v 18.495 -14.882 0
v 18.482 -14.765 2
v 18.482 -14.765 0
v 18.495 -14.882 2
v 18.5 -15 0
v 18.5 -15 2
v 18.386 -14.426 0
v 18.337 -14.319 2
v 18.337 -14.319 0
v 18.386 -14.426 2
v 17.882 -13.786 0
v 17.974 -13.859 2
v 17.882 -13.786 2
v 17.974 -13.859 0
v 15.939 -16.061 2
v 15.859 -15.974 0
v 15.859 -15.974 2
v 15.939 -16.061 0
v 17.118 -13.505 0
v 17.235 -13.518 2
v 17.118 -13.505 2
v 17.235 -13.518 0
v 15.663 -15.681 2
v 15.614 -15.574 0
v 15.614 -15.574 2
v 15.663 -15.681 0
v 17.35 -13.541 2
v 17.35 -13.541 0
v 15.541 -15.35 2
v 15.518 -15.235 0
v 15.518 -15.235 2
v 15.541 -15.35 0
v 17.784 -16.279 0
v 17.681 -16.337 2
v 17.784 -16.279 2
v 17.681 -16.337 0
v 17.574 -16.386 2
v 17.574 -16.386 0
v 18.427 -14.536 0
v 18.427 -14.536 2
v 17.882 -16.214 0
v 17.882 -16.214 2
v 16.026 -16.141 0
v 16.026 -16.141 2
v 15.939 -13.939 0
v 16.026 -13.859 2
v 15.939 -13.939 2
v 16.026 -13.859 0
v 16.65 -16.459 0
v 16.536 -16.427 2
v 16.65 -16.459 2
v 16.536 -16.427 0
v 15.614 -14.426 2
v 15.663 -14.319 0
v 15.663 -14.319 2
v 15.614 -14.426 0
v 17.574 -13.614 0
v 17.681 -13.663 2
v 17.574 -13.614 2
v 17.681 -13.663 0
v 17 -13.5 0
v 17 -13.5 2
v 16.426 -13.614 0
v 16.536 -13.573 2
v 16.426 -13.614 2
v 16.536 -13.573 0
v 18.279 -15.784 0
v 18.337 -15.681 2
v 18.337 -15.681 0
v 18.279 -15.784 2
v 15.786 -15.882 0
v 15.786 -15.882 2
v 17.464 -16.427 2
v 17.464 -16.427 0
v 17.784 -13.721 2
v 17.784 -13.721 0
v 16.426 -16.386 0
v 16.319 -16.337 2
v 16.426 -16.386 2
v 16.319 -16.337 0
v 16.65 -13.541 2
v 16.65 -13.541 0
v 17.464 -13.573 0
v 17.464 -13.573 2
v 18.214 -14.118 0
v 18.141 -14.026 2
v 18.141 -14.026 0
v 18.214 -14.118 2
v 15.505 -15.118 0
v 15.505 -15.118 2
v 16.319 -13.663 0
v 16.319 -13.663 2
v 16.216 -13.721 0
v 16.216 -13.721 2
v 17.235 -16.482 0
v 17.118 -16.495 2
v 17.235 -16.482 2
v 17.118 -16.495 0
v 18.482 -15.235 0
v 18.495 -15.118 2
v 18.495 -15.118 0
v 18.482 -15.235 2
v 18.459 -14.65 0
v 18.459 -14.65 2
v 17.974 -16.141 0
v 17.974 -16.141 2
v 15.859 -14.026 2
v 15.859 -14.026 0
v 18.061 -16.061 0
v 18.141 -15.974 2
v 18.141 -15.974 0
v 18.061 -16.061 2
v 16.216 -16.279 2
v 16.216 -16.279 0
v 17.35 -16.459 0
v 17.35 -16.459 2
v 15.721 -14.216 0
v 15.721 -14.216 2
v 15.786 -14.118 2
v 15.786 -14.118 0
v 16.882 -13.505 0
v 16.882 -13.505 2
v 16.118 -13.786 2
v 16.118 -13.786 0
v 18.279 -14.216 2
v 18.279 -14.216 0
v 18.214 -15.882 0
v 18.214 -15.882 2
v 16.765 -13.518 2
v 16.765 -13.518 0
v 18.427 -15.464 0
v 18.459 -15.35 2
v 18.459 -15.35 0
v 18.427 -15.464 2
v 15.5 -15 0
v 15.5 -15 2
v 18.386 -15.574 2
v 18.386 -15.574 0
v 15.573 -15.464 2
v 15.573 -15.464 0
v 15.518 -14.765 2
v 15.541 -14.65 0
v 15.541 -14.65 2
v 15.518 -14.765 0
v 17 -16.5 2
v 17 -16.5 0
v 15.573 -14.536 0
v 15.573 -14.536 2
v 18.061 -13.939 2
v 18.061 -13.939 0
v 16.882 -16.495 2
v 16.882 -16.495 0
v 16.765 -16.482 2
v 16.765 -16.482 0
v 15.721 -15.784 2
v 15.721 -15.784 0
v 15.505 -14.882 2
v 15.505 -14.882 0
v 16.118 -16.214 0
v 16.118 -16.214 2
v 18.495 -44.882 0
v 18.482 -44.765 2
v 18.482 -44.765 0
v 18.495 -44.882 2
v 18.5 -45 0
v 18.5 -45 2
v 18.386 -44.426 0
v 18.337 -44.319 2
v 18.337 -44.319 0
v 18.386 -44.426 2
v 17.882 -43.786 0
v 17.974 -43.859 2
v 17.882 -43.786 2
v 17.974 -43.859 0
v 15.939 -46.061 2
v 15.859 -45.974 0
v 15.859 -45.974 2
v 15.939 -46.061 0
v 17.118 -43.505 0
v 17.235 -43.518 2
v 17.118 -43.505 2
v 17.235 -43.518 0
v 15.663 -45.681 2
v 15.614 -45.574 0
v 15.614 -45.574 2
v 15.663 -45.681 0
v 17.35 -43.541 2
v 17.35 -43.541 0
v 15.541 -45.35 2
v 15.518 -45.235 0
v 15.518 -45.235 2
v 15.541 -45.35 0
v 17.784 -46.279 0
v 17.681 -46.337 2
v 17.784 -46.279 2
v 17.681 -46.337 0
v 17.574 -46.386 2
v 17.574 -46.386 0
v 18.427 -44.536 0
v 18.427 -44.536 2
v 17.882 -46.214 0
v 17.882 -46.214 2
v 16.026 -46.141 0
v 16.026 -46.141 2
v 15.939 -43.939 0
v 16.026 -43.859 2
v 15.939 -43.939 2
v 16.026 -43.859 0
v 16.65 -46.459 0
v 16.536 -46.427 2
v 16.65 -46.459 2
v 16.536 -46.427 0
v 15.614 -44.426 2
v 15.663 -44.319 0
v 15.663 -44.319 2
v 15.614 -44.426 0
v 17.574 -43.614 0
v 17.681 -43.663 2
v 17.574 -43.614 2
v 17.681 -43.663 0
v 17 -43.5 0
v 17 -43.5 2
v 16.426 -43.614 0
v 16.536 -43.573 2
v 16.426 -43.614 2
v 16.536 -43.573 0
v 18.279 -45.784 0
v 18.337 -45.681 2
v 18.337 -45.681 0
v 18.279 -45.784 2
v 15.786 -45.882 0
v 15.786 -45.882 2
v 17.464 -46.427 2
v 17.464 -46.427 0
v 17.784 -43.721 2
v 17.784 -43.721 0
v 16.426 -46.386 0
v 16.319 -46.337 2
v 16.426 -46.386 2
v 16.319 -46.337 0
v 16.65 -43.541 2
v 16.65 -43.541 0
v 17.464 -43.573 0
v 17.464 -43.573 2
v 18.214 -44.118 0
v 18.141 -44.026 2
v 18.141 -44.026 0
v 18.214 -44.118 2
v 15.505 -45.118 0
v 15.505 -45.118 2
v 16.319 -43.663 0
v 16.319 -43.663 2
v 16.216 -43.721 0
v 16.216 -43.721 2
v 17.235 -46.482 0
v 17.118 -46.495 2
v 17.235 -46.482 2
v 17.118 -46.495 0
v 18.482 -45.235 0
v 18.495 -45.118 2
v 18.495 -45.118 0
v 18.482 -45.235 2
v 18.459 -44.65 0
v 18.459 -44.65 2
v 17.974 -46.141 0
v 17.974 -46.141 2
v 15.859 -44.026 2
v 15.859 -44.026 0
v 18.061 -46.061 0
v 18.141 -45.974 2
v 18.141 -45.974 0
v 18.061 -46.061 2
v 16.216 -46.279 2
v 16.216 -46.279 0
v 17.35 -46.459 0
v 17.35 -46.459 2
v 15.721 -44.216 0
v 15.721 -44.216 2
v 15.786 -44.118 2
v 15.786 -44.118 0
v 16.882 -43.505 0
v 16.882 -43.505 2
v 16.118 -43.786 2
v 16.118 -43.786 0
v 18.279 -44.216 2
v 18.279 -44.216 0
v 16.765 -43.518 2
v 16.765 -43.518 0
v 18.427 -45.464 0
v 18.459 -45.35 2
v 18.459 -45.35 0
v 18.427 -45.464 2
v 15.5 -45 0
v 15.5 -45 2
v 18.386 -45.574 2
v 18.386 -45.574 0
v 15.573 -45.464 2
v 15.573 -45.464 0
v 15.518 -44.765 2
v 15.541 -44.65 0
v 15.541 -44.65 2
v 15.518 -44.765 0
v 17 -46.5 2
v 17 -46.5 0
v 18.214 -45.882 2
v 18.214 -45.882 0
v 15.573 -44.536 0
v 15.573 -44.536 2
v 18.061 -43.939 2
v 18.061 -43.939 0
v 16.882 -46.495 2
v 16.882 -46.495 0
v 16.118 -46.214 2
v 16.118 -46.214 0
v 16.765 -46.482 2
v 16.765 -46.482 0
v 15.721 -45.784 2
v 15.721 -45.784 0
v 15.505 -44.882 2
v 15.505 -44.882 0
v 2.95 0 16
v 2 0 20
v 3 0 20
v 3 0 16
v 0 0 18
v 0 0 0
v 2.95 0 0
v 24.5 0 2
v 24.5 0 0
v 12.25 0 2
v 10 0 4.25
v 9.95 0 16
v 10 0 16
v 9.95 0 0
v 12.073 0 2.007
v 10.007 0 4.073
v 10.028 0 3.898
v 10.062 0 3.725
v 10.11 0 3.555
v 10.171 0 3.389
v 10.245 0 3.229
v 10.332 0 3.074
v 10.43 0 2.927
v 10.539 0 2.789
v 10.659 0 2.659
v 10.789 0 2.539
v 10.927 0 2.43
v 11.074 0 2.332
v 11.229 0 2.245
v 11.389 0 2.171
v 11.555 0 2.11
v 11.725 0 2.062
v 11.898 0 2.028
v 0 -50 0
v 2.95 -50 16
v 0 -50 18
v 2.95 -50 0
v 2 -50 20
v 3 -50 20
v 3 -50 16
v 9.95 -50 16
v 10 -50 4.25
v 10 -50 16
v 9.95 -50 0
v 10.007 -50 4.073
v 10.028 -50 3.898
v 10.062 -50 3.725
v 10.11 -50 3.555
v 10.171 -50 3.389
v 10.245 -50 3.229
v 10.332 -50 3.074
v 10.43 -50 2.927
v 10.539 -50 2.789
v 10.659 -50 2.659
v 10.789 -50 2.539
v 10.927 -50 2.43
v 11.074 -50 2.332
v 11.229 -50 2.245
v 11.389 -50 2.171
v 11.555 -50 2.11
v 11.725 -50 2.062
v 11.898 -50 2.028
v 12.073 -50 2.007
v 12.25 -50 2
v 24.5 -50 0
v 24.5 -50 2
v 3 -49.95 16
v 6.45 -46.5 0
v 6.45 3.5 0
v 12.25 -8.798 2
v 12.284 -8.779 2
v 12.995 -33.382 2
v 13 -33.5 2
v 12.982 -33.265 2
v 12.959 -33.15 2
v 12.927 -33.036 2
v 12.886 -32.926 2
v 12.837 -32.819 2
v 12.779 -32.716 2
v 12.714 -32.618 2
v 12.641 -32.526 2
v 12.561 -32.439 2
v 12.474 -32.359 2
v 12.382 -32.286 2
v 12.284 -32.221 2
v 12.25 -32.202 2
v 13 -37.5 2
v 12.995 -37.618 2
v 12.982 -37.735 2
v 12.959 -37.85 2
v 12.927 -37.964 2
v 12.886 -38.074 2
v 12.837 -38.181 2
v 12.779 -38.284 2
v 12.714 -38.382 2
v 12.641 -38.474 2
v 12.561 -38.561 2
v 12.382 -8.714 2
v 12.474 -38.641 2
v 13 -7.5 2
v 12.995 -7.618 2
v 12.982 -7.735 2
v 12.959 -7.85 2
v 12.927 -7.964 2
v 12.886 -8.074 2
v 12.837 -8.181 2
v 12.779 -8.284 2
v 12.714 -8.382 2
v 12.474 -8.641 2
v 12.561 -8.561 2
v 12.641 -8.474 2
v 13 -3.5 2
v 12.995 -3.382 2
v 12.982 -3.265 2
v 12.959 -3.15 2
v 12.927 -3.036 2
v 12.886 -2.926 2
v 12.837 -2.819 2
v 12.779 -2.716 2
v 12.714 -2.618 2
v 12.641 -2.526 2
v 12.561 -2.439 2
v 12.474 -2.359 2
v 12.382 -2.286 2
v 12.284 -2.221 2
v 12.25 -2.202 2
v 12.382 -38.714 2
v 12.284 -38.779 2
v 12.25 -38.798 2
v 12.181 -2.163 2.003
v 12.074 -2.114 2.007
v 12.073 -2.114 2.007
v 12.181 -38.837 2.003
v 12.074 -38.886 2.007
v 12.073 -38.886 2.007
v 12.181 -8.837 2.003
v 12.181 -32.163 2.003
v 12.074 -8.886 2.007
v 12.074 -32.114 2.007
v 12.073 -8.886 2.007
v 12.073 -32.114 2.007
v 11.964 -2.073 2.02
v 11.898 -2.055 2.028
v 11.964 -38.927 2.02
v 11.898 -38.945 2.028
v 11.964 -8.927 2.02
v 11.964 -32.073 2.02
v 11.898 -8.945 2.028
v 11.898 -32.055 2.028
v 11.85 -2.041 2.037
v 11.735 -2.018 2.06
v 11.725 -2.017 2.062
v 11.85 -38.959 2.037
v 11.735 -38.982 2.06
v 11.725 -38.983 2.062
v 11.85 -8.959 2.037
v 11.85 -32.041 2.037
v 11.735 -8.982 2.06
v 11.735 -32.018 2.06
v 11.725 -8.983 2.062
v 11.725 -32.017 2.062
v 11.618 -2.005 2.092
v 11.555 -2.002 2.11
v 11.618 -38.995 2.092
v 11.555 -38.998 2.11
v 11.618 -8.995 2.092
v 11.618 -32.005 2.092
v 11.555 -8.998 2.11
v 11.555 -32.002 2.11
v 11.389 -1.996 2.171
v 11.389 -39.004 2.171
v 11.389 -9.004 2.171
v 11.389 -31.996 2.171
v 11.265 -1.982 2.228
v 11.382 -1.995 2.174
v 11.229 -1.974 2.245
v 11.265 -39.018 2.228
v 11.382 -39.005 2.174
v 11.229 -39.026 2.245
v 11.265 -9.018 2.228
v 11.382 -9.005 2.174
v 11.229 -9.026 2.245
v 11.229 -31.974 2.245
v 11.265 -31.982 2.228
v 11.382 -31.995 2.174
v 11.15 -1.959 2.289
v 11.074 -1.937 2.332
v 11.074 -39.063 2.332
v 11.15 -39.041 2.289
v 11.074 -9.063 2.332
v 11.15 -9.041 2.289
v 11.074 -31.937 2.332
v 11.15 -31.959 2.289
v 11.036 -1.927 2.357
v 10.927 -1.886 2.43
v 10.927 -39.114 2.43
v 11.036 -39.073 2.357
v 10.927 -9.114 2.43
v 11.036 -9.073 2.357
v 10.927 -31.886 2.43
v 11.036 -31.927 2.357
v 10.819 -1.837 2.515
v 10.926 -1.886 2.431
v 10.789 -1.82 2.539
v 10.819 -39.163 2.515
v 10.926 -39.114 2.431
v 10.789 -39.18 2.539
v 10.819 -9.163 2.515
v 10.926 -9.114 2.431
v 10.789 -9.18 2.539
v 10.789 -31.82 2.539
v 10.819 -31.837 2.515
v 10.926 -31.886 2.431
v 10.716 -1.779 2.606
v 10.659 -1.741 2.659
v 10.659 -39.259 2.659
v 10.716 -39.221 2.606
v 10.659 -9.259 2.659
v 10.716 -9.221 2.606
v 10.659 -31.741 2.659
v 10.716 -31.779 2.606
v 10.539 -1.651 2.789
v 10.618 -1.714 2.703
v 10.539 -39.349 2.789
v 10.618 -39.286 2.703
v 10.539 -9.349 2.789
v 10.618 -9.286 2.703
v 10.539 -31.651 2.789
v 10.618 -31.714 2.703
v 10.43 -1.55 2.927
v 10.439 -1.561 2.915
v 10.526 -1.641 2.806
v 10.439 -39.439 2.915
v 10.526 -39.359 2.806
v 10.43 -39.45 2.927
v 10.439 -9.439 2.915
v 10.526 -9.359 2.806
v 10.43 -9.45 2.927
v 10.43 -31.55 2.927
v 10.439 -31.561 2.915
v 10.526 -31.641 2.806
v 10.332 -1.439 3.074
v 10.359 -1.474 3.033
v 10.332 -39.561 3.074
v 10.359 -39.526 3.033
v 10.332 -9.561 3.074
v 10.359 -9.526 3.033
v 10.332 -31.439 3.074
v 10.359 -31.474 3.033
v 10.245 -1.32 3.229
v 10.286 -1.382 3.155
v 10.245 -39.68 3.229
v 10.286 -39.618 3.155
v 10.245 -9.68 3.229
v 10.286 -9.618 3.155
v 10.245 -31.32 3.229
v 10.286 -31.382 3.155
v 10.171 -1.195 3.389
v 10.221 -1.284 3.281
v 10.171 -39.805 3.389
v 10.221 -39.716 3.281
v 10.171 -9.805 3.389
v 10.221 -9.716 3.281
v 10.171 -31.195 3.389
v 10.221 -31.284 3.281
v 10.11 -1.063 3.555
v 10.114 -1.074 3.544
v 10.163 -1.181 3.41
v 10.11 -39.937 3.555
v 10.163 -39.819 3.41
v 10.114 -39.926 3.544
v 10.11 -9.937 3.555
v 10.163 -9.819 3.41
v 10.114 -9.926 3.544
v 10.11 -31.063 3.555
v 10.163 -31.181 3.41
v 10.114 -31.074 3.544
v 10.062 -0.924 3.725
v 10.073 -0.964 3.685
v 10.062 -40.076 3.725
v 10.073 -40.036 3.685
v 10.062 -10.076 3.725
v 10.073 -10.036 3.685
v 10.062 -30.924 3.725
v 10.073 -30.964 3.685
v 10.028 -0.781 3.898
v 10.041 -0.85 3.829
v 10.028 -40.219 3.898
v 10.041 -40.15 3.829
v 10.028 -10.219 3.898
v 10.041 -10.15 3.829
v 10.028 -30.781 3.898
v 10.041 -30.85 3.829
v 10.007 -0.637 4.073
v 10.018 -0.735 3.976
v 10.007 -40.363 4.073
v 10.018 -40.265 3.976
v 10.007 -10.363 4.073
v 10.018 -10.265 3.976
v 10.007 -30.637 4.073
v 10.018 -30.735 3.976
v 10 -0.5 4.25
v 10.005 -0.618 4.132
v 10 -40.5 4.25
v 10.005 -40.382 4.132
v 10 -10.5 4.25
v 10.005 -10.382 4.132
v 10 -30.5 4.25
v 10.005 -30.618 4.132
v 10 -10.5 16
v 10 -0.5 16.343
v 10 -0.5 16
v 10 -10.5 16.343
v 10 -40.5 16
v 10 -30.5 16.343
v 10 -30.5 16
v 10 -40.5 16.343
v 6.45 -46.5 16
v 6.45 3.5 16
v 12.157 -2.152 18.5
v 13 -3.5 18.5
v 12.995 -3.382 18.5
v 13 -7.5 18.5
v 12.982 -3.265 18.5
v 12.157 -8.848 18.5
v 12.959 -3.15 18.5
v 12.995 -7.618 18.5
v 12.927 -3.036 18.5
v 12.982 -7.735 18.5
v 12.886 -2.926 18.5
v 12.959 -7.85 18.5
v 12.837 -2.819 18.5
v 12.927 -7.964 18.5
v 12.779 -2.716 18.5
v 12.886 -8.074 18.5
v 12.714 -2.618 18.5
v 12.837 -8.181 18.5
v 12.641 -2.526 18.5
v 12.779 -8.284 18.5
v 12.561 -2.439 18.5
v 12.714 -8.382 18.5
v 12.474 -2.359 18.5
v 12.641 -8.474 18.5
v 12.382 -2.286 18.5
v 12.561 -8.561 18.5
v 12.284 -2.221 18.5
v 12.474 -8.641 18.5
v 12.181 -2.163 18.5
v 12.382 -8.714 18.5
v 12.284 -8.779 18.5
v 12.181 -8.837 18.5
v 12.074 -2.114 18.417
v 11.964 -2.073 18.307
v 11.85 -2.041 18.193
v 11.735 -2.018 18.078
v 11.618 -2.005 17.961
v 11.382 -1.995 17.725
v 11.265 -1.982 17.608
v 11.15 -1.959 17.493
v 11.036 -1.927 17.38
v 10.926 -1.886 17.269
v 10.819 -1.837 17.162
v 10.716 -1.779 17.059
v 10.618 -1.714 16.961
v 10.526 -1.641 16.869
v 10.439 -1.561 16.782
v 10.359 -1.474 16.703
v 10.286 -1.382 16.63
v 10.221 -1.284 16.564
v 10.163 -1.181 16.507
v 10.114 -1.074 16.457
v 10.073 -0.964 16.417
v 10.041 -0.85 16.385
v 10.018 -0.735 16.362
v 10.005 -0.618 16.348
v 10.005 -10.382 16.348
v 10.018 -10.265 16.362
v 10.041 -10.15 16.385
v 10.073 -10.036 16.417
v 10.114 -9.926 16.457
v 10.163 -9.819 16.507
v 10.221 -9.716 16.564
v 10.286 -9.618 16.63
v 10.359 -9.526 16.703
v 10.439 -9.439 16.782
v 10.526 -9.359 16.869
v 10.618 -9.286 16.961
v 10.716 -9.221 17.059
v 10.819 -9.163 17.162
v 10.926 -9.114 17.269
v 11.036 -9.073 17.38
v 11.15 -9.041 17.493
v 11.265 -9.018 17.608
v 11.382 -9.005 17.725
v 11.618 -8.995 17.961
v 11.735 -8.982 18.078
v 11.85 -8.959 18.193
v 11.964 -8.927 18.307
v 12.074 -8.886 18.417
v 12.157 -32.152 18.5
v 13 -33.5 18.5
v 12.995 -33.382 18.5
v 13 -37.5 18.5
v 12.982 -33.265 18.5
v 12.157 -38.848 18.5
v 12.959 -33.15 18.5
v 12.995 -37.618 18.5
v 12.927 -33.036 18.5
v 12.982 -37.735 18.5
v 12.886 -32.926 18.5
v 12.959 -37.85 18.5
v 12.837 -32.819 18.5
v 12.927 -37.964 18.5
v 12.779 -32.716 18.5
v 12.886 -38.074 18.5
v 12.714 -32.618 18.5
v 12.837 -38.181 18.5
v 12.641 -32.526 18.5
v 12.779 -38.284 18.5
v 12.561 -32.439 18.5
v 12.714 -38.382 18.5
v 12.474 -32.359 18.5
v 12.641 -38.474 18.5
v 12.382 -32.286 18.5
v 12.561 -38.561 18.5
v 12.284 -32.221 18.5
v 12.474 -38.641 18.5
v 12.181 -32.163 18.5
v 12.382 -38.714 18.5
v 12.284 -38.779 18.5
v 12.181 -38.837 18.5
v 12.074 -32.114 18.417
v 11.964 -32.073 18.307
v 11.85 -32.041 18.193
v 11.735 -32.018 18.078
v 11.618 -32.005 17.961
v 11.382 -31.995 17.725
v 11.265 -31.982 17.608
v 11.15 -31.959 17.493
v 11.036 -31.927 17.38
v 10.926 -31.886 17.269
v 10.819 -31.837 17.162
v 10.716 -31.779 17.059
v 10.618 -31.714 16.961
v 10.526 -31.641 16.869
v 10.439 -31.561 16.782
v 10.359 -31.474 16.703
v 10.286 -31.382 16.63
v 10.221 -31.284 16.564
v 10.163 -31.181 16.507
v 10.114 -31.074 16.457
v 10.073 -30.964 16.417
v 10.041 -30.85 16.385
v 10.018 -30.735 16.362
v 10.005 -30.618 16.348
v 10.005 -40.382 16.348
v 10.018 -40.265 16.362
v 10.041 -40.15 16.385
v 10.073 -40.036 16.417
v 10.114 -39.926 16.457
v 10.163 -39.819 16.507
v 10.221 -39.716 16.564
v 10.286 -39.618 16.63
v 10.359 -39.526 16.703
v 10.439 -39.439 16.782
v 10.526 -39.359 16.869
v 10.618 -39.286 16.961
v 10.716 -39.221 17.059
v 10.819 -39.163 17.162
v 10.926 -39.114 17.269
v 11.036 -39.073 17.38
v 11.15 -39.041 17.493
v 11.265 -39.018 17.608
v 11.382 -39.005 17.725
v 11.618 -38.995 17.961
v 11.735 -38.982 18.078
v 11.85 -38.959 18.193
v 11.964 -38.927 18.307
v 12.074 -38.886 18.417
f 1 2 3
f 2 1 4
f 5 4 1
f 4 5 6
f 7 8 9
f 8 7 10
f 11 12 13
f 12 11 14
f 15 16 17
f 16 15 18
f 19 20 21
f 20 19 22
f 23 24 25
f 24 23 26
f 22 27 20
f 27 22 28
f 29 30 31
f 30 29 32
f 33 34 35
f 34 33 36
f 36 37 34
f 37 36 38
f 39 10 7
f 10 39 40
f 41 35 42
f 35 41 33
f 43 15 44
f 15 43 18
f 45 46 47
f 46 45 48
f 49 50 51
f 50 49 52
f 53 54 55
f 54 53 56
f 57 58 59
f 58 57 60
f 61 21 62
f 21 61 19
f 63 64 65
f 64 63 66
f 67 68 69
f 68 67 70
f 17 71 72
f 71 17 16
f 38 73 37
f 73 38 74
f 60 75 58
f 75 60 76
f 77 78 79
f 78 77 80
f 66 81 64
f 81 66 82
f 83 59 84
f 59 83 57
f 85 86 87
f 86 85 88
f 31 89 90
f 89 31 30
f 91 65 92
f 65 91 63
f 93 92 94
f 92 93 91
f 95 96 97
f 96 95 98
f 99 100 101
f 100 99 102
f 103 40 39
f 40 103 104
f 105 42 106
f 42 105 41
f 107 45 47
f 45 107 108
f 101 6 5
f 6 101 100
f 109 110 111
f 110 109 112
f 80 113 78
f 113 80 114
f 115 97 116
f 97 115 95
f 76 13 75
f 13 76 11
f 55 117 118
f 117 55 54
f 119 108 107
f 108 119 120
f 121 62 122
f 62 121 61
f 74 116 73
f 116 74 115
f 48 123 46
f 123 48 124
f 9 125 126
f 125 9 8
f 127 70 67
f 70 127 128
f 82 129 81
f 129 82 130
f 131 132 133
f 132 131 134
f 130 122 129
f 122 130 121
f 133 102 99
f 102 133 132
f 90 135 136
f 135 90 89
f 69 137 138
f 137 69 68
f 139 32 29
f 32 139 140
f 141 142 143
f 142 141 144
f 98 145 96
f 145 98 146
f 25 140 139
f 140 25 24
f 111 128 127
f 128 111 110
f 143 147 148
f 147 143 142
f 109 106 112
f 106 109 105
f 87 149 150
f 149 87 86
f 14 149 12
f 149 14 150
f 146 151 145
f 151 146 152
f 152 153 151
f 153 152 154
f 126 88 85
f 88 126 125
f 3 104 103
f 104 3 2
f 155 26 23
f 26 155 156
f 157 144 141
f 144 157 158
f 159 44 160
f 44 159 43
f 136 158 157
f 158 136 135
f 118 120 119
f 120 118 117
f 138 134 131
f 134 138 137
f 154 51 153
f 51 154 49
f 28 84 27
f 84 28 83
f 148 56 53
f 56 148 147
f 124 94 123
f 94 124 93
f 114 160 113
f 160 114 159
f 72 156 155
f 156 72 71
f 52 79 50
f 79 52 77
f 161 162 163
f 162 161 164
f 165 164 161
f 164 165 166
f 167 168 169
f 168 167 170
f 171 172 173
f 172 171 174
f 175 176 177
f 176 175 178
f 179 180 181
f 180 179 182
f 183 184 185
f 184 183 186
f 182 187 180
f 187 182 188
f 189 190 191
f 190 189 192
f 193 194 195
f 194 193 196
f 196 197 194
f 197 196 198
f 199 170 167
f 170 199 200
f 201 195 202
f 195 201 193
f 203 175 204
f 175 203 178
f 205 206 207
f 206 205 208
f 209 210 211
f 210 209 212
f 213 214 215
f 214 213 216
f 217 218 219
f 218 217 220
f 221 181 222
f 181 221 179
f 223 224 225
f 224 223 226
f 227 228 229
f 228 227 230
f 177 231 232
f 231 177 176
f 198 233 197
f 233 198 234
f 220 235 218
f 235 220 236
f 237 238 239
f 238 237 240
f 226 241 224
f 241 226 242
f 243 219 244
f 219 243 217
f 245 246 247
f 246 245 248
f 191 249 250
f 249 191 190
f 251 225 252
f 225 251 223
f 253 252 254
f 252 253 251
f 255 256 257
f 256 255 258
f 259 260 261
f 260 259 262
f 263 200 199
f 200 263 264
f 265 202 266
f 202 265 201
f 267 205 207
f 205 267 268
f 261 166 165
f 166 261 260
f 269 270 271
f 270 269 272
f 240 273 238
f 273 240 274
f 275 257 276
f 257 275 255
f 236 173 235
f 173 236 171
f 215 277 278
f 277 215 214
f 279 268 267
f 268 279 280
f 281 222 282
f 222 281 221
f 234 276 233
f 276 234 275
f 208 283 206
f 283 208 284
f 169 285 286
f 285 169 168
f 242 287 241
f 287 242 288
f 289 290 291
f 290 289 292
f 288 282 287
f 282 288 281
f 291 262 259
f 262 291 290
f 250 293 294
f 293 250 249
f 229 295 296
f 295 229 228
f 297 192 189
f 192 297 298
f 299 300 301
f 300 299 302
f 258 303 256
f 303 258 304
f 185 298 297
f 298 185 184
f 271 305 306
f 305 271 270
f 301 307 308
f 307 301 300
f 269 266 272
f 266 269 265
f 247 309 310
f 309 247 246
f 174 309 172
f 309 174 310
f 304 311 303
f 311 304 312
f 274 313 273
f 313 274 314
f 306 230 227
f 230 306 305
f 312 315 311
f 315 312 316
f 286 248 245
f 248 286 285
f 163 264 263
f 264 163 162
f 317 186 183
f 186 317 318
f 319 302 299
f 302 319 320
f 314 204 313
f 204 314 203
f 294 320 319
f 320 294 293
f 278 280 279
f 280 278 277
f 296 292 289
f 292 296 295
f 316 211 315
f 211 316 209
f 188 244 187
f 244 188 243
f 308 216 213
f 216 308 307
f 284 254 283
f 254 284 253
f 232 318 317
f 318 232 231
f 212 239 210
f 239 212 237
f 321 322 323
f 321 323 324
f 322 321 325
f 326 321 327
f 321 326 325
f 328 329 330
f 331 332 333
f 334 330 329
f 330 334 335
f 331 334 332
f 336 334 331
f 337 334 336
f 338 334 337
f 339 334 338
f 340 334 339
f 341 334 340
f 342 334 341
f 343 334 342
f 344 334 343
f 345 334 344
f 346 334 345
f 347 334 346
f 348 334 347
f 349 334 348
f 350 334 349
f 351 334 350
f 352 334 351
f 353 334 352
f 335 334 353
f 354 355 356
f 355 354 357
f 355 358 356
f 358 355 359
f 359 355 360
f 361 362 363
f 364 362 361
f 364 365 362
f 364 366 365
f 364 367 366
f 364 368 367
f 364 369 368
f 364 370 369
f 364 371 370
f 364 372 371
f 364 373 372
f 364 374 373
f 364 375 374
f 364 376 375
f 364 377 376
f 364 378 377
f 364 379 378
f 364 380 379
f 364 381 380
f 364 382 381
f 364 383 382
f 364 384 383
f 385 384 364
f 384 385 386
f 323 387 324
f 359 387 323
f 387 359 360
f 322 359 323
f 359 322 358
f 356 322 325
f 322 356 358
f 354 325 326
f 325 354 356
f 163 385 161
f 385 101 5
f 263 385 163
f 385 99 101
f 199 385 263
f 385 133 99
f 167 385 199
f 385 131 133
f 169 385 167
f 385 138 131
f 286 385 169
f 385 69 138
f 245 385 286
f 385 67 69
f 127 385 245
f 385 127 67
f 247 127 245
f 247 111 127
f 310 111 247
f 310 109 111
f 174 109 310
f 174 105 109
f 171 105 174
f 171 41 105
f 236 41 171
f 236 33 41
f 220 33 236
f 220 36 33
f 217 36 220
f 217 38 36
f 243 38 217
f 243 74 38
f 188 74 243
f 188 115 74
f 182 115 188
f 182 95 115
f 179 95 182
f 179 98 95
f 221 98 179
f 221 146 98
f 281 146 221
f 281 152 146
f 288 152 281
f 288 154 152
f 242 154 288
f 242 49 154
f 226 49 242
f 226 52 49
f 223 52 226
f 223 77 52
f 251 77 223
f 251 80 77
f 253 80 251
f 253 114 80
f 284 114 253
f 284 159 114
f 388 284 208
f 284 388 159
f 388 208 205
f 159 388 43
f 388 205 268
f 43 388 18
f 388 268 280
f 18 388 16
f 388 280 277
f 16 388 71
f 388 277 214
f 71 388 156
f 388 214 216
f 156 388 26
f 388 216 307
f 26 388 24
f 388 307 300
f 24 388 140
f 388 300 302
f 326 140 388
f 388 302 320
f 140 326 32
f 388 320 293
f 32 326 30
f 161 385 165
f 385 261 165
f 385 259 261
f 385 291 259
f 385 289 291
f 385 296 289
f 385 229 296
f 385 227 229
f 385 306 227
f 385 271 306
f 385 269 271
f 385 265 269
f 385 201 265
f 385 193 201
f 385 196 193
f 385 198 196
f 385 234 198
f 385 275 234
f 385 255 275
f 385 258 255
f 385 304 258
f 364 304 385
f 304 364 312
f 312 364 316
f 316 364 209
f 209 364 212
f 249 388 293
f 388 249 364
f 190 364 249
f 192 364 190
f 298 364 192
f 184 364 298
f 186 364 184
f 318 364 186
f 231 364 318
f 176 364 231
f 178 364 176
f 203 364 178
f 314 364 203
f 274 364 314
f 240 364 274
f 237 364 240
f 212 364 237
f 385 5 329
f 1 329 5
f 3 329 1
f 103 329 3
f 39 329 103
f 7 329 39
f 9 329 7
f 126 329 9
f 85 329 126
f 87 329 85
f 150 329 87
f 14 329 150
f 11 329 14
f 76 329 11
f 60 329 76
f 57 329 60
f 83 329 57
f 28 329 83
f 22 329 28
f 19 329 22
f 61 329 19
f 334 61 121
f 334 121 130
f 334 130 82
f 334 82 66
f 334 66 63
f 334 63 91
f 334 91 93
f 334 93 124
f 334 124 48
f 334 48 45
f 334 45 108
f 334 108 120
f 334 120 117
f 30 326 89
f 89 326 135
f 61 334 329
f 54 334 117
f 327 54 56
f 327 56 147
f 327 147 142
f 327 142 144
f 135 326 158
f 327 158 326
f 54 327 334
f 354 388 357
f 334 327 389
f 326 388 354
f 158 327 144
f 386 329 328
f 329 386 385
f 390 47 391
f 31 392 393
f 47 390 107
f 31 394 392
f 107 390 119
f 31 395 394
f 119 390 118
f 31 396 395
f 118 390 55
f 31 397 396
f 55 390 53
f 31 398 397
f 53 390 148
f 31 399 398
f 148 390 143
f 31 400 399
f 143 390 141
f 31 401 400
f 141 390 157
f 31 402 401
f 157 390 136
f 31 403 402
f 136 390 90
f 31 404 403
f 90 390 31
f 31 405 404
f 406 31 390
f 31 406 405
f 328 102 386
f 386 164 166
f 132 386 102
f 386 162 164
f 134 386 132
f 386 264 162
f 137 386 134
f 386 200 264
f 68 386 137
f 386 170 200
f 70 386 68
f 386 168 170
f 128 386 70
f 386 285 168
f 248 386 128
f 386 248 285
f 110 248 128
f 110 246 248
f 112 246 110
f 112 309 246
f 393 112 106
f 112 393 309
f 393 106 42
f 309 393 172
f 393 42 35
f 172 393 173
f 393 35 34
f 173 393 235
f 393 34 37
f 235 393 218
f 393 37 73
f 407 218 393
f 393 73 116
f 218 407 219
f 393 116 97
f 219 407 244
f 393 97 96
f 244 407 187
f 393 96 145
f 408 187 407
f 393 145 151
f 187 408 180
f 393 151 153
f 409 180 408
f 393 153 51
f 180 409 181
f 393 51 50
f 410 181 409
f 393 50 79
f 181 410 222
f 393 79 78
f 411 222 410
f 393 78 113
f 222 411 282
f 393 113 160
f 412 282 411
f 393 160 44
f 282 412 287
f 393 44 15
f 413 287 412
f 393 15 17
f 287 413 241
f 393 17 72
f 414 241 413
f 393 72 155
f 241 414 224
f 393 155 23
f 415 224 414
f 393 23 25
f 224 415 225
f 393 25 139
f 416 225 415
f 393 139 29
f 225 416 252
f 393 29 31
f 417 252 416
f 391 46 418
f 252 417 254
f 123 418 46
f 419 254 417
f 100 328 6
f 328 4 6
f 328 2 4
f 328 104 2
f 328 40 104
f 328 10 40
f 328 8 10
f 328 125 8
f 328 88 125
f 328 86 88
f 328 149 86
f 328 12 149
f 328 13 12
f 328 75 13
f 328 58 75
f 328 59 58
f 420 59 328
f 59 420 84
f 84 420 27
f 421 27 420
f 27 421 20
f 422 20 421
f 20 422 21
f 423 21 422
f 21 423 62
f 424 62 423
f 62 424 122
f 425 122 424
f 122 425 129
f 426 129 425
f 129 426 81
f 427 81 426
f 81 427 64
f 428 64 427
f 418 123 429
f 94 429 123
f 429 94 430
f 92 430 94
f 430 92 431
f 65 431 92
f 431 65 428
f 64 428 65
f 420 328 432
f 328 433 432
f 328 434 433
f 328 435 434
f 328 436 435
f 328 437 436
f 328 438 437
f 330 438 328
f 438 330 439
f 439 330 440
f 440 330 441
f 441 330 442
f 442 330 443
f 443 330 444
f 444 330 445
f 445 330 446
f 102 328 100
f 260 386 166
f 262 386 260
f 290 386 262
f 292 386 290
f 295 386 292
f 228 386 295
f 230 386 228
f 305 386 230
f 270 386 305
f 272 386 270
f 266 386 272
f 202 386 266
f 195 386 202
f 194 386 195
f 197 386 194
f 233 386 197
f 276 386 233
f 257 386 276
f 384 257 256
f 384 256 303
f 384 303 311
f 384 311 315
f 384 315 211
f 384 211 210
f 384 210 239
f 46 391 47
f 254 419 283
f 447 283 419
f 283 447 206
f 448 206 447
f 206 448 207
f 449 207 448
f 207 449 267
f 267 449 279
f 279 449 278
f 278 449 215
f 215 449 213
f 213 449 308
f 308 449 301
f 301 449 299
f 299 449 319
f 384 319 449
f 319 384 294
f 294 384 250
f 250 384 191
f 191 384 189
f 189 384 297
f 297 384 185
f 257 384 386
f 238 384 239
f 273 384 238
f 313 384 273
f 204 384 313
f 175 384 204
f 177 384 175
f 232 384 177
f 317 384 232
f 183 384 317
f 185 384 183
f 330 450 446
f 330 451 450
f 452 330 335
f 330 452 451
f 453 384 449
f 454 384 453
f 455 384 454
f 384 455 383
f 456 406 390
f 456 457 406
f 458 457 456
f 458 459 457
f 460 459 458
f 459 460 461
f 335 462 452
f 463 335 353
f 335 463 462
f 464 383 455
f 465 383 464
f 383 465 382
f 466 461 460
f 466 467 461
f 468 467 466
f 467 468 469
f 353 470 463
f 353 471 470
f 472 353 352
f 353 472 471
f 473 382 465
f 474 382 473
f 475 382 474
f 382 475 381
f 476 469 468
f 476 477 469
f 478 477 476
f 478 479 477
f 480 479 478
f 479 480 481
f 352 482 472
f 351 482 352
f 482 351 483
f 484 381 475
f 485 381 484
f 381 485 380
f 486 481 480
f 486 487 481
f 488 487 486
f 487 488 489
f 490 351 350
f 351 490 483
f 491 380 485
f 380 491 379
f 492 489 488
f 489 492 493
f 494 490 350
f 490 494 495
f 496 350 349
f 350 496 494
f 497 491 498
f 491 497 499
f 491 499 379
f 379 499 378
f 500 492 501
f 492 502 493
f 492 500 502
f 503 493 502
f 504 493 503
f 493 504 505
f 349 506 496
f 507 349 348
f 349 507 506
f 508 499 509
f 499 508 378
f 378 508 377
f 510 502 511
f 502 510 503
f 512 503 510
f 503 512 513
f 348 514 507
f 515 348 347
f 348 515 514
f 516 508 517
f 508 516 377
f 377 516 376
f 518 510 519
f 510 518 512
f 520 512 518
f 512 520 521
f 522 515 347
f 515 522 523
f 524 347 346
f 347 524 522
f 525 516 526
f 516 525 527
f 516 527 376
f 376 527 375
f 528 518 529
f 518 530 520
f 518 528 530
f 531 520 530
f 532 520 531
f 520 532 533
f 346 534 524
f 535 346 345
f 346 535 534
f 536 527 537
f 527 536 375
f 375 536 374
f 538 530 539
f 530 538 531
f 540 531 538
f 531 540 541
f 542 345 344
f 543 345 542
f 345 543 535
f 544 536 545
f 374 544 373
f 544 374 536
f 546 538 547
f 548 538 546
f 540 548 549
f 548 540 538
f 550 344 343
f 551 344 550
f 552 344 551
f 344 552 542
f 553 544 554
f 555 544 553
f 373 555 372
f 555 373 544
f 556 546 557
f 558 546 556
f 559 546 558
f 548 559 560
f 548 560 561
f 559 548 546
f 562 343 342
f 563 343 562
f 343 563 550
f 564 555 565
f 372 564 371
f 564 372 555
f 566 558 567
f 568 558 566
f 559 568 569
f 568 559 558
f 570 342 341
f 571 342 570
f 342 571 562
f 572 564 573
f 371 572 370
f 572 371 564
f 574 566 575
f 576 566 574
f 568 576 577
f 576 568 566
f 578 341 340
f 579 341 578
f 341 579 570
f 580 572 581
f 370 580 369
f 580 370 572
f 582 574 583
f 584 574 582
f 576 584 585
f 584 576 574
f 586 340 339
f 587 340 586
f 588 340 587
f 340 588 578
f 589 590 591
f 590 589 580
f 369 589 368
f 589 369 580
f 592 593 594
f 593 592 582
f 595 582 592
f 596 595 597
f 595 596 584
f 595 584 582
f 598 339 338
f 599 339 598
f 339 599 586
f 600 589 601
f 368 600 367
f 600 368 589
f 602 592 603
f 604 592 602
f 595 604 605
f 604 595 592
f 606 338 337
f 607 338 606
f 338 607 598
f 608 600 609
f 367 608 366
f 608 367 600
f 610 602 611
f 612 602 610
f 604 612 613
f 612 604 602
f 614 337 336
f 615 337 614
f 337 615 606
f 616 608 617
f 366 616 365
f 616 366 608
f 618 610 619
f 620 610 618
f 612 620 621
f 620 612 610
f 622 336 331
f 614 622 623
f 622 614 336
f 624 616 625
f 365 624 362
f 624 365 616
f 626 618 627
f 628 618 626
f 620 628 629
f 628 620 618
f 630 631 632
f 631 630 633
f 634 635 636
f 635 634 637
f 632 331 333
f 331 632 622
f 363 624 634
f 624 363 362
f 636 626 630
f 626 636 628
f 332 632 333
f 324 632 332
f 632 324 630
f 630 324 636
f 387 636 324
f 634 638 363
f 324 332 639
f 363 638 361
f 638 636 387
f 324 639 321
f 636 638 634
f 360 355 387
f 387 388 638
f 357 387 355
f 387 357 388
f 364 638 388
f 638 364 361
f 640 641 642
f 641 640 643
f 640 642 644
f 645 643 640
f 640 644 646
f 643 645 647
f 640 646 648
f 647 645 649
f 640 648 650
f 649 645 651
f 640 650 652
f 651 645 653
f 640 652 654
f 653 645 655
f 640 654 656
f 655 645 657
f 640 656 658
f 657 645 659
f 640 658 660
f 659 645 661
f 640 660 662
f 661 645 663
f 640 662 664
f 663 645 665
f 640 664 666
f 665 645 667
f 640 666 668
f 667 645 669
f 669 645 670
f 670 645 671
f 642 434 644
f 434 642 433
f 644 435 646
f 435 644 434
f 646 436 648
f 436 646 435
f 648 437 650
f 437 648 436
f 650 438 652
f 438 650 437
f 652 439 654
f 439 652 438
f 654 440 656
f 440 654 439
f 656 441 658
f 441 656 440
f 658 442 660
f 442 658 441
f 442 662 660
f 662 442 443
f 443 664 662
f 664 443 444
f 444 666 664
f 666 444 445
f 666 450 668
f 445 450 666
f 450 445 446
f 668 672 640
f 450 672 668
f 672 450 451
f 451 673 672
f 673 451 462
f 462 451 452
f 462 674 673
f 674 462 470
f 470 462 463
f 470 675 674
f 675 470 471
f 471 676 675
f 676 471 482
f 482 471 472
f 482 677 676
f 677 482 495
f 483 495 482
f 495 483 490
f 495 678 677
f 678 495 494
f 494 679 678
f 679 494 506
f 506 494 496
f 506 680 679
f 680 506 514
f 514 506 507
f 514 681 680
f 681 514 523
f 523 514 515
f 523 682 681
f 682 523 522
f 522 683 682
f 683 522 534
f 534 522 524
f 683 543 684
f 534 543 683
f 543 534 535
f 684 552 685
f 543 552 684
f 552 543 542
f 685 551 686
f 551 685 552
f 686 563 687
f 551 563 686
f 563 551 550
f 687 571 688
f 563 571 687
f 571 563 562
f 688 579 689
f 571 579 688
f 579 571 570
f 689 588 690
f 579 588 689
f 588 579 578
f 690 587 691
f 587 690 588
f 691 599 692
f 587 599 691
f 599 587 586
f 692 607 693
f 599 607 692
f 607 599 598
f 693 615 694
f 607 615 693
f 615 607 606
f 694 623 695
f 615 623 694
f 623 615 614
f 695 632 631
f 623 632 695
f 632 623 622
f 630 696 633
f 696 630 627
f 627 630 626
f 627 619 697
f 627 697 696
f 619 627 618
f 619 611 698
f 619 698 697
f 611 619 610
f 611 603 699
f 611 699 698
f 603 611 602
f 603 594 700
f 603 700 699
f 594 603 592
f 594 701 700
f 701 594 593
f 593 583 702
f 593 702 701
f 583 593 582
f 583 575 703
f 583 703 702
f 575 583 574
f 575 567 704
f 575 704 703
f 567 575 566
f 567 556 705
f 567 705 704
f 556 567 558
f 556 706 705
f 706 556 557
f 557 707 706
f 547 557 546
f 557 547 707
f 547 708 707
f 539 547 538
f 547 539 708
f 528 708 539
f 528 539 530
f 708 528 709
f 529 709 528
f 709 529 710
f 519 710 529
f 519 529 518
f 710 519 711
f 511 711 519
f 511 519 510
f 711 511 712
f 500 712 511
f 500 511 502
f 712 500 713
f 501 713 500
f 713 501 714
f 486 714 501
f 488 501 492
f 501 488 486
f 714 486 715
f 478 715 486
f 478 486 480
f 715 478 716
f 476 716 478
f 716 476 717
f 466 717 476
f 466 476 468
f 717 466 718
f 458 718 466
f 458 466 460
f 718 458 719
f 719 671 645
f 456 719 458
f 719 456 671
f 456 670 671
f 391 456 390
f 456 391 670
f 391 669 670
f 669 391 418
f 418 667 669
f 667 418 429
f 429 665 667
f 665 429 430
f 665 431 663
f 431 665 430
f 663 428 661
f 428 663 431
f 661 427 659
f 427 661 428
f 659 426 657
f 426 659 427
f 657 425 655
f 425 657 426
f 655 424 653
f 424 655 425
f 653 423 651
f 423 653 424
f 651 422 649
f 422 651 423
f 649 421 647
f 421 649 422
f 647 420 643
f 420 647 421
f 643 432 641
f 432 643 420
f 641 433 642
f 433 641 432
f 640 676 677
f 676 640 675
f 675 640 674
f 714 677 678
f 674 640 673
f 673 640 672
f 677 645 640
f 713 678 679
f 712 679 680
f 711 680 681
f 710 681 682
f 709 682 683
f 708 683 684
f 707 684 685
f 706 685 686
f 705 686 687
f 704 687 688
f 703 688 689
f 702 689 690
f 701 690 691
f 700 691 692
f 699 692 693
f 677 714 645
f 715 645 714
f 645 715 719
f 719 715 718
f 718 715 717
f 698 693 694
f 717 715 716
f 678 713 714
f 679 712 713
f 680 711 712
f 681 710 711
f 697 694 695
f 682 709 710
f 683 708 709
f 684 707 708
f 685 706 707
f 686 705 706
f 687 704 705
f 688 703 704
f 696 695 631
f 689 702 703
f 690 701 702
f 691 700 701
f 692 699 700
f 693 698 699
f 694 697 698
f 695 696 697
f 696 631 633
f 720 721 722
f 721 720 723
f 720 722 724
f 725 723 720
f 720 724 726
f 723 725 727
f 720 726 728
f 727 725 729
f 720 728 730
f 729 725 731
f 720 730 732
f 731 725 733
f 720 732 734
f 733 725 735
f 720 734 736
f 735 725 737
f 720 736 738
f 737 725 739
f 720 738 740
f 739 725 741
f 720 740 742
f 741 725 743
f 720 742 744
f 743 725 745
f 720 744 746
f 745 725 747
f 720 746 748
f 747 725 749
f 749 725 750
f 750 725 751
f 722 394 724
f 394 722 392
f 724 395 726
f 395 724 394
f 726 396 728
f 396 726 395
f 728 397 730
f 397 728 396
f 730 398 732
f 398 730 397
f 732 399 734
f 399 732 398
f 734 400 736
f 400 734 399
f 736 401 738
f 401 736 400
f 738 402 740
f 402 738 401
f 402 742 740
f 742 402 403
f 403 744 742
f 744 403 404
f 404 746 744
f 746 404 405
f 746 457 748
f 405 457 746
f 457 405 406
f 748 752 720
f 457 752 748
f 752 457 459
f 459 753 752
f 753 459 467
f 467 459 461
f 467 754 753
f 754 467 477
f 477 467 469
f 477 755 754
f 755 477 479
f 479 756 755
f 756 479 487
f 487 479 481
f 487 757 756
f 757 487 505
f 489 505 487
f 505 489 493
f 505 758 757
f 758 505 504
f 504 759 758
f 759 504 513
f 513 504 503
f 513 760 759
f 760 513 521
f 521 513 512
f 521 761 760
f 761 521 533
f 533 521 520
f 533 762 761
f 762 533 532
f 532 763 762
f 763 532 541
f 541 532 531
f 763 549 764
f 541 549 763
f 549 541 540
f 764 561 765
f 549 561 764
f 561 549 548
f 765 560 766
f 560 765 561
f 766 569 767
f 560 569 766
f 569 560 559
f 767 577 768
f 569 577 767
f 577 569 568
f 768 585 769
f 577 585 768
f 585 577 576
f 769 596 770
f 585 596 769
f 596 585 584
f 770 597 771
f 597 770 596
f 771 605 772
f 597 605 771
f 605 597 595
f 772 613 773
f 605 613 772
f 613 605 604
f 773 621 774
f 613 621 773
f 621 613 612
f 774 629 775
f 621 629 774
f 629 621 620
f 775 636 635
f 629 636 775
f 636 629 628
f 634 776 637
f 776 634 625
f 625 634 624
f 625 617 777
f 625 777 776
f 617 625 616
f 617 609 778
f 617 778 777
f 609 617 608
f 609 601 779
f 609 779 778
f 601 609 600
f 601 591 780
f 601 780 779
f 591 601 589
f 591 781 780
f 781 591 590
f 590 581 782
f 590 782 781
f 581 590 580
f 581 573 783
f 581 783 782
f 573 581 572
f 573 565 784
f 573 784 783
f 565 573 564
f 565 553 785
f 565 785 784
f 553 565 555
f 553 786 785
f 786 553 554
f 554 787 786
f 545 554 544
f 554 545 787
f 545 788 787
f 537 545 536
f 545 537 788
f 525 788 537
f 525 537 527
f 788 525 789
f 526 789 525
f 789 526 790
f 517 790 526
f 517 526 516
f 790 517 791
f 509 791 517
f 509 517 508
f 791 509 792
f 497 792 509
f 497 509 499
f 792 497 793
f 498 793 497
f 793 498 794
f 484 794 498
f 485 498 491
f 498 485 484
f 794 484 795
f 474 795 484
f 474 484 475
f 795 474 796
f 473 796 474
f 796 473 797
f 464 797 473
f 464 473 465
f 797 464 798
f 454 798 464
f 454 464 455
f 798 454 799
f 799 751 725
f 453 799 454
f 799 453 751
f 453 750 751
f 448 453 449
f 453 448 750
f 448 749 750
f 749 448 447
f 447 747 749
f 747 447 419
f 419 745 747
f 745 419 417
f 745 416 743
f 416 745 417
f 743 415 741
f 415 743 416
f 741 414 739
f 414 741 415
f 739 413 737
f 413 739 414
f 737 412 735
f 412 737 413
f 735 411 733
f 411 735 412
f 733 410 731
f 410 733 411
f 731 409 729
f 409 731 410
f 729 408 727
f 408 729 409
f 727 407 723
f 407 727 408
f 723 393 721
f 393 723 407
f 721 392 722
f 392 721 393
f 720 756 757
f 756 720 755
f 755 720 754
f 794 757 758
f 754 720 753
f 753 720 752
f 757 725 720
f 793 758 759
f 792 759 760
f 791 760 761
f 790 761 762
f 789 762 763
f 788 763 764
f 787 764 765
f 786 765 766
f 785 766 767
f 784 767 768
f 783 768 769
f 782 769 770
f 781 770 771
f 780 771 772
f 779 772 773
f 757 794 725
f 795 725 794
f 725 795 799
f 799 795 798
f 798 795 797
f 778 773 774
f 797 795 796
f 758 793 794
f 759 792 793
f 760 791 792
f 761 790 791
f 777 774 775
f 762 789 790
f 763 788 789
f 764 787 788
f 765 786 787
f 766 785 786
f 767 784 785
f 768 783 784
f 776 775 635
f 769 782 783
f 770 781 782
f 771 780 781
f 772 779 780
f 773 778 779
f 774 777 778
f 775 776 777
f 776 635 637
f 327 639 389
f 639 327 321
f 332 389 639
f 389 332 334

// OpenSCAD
$fn=80;

enclosure_fitting(50);


module enclosure_fitting(piece_length)
{

// main body
base_width = 24.5 ; 
base_height = 2 ;   //default 4
acrylic_thickness = 7 ;
acrylic_catchment_depth = 4 ;
wall_thickness = 10 ;
L_fillet_size = 4.5 ;
L_height = 20 ;  //default45
extrusion = 15 ; 
hyp = pow((pow(acrylic_thickness,2)/2),1/2) ; 


main_length();
//enclosure_fitting_corner();
//translate ([piece_length+base_width ,base_width,0]) rotate ([0,0,-90]) main_length(vremove=false);

module main_length(vremove=true)
{
 difference(){
  rotate ([90,0,0])
    linear_extrude(piece_length) {
      difference() {
        union() {
          square(size = [base_width, base_height]) ;  //bottom of L
          square(size = [wall_thickness, L_height]) ;  // upline of L
          translate([wall_thickness,base_height])
            square(size = [L_fillet_size/2, L_fillet_size/2]) ;  //add for "crook of L" fillet removal
        }
        translate([wall_thickness - acrylic_thickness,L_height-acrylic_catchment_depth])
          square(size = [acrylic_thickness, acrylic_catchment_depth]) ;  //top cutout
        
        translate([0,L_height-2])
          rotate ([0,0,45]) 
            square(size = [4, 4]) ;  //top chamfer

        translate([wall_thickness + 2.25,base_height+L_fillet_size/2])
          circle(d=L_fillet_size); // "crook of L" fillet removal
      }
    }
    
  for (y =[15:30:piece_length]) {
    translate([base_width-(extrusion/2),-y,-10]) cylinder(h = 20 , d=3);
    }
    if (vremove) {//remove V fitting
     translate ([wall_thickness/2-acrylic_thickness/2+hyp,-acrylic_thickness/2-piece_length,0]) rotate ([0,0,45])
    cube ([hyp,hyp,L_height-acrylic_catchment_depth]); 
    }
}
{
//add V fitting

translate ([wall_thickness/2-acrylic_thickness/2+hyp,-acrylic_thickness/2,0]) rotate ([0,0,45])
cube ([hyp,hyp,L_height-acrylic_catchment_depth]);

//30mm interval (20mm gap)
for (y =[7.5 : 30 : piece_length]) {
  translate ([11.5,-y,0])
    arm_bit();
    
    
}
}
}






module arm_bit() {
  // arm bits
  render () //render to remove an artifact.
  difference(){
    union(){
      rotate ([0,0,90])
        linear_extrude(L_height-1.5) 
          difference(){
            union() {
              hull(){
                circle(d=3.0);
                translate([4.0,0])
                  circle(d=3.0);
              }
            translate([-3.0,0]) square([3.0,1.5]);
            translate([4.0,0]) square([3.0,1.5]);
            }
          translate([7.0,0]) circle(d=3.0);
          translate([-3.0,0]) circle(d=3.0);
          }
    }
    translate([-4.5,-10,L_height - 1])  rotate ([0,45,0]) cube([4,20,6]);  //make diagnol
  }
}

module enclosure_fitting_corner(){
translate ([base_width,0,0])
rotate ([0,0,90])
    rotate_extrude(angle=90, convexity=50) {
      2d_corner();
      }
 
    }
    

module 2d_corner()
{
difference() {
        union() {
          square(size = [base_width, base_height]) ;  //bottom of L
          translate ([base_width-wall_thickness,0]) square(size = [wall_thickness, L_height]) ;  // upline of L
          translate([base_width - wall_thickness-L_fillet_size/2,base_height])
            square(size = [L_fillet_size/2, L_fillet_size/2]) ;  //add for "crook of L" fillet removal
        }
        translate([base_width - wall_thickness,L_height-acrylic_catchment_depth])
          square(size = [acrylic_thickness, acrylic_catchment_depth]) ;  //top cutout
        
        translate([base_width,L_height-2])
          rotate ([0,0,45]) 
            square(size = [4, 4]) ;  //top chamfer

        translate([base_width - wall_thickness  - L_fillet_size/2,base_height + L_fillet_size/2])
          circle(d=L_fillet_size); // "crook of L" fillet removal
      }
  
      
}


}
